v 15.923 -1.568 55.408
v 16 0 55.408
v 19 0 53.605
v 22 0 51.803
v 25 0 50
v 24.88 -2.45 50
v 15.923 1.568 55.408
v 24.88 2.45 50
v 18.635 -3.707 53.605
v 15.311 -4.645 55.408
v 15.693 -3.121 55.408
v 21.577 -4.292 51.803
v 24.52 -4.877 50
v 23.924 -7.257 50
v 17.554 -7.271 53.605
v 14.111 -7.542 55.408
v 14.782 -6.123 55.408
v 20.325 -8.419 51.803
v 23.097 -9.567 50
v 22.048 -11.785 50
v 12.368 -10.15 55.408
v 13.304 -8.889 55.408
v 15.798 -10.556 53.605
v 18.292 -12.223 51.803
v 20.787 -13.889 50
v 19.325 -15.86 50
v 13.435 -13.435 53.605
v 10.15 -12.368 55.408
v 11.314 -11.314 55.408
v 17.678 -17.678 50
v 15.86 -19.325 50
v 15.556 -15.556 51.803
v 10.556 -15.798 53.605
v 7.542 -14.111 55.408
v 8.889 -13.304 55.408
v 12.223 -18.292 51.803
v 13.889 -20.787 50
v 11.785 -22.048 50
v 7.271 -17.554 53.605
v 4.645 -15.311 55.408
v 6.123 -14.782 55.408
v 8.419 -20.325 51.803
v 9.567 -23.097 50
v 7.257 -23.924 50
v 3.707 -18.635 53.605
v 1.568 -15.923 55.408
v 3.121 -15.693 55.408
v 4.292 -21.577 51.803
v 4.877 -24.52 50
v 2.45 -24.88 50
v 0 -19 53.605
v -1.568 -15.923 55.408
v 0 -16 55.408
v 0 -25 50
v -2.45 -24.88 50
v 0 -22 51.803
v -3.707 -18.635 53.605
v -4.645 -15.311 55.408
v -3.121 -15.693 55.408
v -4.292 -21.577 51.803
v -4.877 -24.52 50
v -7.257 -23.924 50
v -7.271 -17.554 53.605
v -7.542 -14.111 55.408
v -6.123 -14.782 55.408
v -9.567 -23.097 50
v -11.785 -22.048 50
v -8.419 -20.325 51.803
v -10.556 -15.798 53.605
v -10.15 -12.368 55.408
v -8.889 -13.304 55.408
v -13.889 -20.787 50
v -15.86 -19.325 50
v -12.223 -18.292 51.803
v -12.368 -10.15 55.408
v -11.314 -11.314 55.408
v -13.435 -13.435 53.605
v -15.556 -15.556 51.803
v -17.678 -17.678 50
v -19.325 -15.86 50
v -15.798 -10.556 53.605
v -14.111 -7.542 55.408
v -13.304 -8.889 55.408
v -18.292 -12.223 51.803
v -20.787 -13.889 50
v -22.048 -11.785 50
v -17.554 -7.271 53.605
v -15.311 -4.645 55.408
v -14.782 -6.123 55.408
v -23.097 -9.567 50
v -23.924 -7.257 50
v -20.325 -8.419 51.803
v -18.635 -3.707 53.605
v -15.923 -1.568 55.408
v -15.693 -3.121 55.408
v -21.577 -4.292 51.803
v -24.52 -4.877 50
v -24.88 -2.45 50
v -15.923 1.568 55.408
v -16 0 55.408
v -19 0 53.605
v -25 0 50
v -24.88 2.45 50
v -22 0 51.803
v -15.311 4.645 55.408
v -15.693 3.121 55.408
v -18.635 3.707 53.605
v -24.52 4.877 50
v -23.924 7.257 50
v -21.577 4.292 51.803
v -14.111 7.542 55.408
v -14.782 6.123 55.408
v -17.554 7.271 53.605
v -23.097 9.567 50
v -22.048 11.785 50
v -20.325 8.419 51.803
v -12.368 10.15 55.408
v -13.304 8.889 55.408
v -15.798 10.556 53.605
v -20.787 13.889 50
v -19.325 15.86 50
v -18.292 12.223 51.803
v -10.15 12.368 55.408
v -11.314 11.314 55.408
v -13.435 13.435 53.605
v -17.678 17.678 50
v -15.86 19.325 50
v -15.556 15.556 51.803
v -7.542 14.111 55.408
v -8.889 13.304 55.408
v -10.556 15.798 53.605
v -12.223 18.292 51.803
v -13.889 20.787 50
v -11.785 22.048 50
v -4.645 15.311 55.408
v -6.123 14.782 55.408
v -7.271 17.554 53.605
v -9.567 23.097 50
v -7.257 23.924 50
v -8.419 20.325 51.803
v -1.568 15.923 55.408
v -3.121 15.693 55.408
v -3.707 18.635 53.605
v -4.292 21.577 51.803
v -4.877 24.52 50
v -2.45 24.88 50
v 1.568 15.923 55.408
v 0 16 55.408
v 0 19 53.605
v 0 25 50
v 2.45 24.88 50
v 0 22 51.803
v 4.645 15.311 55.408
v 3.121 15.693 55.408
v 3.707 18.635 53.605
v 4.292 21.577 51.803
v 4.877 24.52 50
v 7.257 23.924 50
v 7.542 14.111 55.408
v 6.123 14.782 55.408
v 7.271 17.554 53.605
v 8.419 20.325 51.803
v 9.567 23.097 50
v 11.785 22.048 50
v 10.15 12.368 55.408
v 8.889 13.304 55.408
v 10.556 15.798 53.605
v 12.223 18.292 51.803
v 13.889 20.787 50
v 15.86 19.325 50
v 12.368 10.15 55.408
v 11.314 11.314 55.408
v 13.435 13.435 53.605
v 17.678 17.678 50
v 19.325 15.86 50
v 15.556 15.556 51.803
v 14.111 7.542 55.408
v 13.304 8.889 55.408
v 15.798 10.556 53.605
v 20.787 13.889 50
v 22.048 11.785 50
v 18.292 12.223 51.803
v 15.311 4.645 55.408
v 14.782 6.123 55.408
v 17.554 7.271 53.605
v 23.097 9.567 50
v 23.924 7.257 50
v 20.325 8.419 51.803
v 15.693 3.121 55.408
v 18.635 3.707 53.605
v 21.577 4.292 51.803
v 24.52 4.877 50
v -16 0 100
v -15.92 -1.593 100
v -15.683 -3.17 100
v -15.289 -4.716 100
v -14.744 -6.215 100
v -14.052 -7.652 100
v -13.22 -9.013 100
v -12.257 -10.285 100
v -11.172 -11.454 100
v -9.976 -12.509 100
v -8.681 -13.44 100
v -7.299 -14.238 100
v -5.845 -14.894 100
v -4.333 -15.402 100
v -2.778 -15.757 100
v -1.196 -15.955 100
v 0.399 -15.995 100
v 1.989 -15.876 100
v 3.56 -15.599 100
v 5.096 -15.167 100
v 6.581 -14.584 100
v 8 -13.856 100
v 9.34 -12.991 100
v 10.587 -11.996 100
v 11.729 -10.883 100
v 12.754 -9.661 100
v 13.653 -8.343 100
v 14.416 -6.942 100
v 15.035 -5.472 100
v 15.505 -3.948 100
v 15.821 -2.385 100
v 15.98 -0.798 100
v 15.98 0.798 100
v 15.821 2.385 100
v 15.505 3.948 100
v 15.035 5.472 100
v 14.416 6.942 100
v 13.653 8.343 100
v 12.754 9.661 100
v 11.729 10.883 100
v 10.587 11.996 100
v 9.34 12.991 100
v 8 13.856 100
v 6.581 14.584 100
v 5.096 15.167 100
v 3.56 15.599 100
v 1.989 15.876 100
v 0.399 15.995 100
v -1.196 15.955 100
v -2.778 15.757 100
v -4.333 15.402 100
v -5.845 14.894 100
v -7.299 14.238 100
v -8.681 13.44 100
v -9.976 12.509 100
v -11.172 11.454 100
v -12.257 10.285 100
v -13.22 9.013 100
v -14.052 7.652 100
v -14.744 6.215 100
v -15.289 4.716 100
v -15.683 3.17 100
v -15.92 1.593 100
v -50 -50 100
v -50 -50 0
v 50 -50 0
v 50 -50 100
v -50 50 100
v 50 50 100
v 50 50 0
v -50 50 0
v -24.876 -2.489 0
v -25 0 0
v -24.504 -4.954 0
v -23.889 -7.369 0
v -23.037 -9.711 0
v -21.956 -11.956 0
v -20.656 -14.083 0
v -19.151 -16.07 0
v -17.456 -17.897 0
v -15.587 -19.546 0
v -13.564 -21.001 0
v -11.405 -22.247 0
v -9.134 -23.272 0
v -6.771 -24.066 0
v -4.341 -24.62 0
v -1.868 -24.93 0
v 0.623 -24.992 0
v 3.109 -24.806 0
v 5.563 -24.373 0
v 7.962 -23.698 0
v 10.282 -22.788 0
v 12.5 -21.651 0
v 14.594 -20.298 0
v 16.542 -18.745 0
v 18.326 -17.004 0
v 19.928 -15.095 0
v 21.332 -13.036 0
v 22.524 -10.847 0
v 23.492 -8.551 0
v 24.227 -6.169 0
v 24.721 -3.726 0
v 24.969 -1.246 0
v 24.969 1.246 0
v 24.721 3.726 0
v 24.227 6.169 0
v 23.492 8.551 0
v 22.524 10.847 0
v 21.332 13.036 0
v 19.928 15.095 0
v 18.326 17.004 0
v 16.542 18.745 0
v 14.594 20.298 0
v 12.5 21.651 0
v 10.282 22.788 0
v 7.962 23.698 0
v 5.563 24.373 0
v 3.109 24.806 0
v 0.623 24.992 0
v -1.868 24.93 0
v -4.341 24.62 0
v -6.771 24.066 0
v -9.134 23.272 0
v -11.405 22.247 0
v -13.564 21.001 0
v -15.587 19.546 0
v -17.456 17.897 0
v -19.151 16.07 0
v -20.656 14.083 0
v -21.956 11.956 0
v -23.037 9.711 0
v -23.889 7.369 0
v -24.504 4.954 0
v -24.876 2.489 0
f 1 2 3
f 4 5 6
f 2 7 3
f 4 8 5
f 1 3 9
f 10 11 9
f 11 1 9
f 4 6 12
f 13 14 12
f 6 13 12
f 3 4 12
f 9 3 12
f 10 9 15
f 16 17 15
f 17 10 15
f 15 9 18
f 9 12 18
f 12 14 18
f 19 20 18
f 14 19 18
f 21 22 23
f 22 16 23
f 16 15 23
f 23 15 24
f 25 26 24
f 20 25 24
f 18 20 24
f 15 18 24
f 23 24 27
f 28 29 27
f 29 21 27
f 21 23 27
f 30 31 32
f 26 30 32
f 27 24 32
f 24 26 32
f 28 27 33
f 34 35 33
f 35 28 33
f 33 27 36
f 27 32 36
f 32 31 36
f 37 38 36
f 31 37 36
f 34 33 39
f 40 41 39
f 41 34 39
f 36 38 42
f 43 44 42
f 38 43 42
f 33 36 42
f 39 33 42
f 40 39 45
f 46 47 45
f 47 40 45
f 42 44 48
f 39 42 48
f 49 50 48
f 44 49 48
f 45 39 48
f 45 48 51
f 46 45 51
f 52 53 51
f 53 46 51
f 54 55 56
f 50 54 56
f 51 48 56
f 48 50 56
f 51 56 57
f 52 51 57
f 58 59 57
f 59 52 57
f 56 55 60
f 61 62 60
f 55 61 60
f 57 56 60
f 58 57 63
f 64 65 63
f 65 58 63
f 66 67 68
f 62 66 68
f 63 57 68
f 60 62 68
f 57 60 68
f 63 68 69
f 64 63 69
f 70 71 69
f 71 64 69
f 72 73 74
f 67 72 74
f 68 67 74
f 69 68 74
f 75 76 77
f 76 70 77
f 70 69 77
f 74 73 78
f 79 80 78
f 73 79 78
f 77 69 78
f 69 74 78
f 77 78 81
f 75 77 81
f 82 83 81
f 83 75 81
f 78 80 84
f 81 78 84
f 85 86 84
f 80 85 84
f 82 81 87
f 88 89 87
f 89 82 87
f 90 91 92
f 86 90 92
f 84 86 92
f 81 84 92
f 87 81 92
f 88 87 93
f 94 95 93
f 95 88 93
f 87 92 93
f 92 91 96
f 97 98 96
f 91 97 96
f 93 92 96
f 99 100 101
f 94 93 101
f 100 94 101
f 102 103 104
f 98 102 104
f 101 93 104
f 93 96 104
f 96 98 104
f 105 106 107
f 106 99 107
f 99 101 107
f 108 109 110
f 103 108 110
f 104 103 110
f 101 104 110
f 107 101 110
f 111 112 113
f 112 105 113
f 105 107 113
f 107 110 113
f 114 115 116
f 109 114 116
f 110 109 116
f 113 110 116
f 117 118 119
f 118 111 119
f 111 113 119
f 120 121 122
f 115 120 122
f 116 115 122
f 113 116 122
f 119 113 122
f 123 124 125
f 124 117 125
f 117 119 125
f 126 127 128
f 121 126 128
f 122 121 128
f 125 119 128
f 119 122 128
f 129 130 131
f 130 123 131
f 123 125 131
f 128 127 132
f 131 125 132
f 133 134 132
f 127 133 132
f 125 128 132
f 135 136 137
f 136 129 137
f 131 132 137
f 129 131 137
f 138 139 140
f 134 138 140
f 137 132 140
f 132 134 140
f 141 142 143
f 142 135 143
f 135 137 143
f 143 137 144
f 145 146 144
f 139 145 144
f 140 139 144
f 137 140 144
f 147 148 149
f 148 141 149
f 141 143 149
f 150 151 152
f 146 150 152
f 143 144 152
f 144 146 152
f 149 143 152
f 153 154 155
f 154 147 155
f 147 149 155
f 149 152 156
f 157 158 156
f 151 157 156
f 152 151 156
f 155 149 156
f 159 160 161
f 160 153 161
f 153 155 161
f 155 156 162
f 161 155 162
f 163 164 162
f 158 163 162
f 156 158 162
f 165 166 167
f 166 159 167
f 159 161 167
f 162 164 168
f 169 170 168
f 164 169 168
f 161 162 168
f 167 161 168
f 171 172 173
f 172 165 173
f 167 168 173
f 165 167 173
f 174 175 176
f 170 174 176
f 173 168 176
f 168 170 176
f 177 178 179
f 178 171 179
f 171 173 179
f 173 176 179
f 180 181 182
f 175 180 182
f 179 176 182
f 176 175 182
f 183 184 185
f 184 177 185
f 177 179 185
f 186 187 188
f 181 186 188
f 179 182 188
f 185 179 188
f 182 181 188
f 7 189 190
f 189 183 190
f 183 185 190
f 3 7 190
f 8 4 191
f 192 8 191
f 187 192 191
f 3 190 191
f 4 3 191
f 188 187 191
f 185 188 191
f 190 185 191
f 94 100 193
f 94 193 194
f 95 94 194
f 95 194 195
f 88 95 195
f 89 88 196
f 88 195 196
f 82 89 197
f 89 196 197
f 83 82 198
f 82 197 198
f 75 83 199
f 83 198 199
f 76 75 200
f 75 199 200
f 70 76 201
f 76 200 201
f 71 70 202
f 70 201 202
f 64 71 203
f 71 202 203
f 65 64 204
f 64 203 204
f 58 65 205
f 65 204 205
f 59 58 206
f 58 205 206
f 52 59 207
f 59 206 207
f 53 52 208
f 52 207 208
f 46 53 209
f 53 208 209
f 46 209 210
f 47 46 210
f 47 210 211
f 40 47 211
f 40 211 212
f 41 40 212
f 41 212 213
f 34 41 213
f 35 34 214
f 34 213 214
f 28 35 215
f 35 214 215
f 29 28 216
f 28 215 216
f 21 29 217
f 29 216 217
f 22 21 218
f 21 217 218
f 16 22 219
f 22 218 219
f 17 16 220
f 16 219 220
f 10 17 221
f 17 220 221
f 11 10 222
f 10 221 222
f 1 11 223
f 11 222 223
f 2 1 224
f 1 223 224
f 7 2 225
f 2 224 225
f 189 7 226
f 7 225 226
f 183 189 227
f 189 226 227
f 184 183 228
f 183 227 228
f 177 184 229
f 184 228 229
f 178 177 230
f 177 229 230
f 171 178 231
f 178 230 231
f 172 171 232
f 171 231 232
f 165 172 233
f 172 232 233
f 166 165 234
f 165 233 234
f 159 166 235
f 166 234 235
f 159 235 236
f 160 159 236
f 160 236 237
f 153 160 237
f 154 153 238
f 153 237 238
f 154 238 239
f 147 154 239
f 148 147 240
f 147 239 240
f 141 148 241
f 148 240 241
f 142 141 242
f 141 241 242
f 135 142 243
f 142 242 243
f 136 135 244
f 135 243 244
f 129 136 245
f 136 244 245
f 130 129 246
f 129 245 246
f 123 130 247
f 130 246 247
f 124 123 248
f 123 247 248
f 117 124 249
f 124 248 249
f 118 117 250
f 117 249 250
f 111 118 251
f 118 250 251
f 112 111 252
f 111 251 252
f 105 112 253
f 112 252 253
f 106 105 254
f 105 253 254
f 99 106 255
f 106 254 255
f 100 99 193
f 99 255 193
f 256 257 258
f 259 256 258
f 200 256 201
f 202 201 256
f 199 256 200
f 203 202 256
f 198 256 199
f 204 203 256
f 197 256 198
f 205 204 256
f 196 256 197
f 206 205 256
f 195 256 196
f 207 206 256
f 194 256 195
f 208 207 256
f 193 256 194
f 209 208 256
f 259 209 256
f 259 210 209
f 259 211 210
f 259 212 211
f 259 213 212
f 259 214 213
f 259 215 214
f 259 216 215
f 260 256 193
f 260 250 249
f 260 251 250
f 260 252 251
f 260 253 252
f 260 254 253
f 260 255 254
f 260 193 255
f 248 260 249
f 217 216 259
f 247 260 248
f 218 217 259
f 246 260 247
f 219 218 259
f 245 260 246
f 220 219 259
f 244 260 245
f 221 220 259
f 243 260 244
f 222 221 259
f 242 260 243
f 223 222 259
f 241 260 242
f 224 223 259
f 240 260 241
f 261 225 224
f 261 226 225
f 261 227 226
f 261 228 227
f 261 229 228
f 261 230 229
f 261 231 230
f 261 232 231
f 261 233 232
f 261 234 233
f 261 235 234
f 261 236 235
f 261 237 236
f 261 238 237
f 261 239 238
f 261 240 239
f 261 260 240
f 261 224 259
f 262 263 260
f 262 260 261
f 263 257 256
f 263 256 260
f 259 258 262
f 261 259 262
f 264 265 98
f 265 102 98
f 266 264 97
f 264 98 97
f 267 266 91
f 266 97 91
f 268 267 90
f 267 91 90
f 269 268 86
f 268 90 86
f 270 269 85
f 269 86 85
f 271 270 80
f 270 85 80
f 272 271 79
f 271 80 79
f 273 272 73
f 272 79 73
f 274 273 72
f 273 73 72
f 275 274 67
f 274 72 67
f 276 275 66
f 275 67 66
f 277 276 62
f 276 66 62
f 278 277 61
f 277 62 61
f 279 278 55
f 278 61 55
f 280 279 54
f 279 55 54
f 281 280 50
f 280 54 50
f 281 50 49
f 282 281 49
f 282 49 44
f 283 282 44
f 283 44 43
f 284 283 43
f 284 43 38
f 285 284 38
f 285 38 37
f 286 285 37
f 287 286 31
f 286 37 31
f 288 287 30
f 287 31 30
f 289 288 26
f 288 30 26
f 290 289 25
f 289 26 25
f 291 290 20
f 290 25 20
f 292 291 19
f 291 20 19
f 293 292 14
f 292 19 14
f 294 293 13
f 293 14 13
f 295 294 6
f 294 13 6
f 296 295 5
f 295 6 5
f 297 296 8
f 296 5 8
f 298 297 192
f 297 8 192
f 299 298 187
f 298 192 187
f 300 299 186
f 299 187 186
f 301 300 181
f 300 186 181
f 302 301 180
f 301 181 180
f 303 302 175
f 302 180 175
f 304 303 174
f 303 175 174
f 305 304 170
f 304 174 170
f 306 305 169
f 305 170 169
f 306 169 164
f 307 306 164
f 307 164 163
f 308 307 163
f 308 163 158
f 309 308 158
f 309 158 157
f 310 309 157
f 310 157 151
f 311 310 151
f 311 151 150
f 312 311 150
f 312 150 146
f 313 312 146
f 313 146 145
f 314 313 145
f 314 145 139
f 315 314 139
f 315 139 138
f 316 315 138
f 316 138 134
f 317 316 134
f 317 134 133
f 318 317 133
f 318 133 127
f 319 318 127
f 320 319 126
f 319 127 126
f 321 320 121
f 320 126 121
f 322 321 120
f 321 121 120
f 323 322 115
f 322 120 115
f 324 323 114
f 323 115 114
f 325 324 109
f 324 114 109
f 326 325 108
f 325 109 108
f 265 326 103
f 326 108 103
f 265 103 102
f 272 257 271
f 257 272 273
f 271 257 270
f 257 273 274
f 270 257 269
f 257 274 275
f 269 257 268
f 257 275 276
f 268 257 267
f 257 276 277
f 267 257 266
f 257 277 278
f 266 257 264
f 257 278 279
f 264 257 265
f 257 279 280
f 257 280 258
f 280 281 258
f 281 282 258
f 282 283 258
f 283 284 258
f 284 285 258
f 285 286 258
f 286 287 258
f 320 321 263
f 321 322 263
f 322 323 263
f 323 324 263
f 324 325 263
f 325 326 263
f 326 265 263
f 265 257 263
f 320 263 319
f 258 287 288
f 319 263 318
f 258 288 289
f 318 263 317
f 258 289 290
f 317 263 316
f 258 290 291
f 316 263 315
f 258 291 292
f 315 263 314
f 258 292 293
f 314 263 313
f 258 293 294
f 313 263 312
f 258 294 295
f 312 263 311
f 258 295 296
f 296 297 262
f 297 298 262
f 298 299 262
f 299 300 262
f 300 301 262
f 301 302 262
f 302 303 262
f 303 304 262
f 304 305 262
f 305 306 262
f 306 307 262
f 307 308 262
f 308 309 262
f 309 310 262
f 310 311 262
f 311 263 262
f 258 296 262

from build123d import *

# Parameters (mm, degrees)
F0_W     = 100
F0_H     = 100
F1_DEPTH = 100
F2_D     = 32
F3_D     = 50
F3_DEPTH = 50
F3_TIP   = 15.0215154757


with BuildPart() as f1:
    # F0 (on Top) → F1 (new body)
    with BuildSketch(Plane.XY):
        Rectangle(F0_W, F0_H)
    extrude(amount=F1_DEPTH)

    # F2 (through all)
    with Locations(Plane(origin=(0, 0, 0), x_dir=(1, 0, 0), z_dir=(0, 0, -1))):
        with Locations((0, 0)):
            Hole(F2_D / 2)

    # F3
    with Locations(Plane(origin=(0, 0, 0), x_dir=(1, 0, 0), z_dir=(0, 0, -1))):
        with Locations((0, 0)):
            Hole(F3_D / 2, depth=F3_DEPTH)
            with Locations((0, 0, -(F3_DEPTH + F3_TIP / 2))):  # 118° drill point
                Cone(0, F3_D / 2, F3_TIP, mode=Mode.SUBTRACT)


solid = f1.part
